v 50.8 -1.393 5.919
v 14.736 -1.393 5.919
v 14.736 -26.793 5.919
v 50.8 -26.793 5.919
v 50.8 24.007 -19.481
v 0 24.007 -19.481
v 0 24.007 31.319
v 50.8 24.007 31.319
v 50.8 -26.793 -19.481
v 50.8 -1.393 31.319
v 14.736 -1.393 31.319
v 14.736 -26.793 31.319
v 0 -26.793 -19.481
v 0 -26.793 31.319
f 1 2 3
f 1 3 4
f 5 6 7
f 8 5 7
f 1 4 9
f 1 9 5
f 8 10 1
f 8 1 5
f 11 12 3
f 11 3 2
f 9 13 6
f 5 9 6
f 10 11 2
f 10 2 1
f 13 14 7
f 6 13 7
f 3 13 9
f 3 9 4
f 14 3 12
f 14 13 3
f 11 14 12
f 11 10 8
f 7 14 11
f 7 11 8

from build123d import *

# Parameters (mm, degrees)
F0_W     = 50.8
F0_H     = 50.8
F1_DEPTH = 50.8
F2_W     = 36.0644307539
F2_H     = 25.4
F3_DEPTH = 25.4


with BuildPart() as f1:
    # F0 (on Right) → F1 (new body)
    with BuildSketch(Plane.YZ):
        with Locations((-1.3928227127, 5.918835211)):
            Rectangle(F0_W, F0_H)
    extrude(amount=F1_DEPTH)

    # F2 (on face) → F3 (cut)
    with BuildSketch(Plane.XY.offset(31.318835211)):
        with Locations((32.7677846231, -14.0928227127)):
            Rectangle(F2_W, F2_H)
    extrude(amount=-F3_DEPTH, mode=Mode.SUBTRACT)


solid = f1.part
